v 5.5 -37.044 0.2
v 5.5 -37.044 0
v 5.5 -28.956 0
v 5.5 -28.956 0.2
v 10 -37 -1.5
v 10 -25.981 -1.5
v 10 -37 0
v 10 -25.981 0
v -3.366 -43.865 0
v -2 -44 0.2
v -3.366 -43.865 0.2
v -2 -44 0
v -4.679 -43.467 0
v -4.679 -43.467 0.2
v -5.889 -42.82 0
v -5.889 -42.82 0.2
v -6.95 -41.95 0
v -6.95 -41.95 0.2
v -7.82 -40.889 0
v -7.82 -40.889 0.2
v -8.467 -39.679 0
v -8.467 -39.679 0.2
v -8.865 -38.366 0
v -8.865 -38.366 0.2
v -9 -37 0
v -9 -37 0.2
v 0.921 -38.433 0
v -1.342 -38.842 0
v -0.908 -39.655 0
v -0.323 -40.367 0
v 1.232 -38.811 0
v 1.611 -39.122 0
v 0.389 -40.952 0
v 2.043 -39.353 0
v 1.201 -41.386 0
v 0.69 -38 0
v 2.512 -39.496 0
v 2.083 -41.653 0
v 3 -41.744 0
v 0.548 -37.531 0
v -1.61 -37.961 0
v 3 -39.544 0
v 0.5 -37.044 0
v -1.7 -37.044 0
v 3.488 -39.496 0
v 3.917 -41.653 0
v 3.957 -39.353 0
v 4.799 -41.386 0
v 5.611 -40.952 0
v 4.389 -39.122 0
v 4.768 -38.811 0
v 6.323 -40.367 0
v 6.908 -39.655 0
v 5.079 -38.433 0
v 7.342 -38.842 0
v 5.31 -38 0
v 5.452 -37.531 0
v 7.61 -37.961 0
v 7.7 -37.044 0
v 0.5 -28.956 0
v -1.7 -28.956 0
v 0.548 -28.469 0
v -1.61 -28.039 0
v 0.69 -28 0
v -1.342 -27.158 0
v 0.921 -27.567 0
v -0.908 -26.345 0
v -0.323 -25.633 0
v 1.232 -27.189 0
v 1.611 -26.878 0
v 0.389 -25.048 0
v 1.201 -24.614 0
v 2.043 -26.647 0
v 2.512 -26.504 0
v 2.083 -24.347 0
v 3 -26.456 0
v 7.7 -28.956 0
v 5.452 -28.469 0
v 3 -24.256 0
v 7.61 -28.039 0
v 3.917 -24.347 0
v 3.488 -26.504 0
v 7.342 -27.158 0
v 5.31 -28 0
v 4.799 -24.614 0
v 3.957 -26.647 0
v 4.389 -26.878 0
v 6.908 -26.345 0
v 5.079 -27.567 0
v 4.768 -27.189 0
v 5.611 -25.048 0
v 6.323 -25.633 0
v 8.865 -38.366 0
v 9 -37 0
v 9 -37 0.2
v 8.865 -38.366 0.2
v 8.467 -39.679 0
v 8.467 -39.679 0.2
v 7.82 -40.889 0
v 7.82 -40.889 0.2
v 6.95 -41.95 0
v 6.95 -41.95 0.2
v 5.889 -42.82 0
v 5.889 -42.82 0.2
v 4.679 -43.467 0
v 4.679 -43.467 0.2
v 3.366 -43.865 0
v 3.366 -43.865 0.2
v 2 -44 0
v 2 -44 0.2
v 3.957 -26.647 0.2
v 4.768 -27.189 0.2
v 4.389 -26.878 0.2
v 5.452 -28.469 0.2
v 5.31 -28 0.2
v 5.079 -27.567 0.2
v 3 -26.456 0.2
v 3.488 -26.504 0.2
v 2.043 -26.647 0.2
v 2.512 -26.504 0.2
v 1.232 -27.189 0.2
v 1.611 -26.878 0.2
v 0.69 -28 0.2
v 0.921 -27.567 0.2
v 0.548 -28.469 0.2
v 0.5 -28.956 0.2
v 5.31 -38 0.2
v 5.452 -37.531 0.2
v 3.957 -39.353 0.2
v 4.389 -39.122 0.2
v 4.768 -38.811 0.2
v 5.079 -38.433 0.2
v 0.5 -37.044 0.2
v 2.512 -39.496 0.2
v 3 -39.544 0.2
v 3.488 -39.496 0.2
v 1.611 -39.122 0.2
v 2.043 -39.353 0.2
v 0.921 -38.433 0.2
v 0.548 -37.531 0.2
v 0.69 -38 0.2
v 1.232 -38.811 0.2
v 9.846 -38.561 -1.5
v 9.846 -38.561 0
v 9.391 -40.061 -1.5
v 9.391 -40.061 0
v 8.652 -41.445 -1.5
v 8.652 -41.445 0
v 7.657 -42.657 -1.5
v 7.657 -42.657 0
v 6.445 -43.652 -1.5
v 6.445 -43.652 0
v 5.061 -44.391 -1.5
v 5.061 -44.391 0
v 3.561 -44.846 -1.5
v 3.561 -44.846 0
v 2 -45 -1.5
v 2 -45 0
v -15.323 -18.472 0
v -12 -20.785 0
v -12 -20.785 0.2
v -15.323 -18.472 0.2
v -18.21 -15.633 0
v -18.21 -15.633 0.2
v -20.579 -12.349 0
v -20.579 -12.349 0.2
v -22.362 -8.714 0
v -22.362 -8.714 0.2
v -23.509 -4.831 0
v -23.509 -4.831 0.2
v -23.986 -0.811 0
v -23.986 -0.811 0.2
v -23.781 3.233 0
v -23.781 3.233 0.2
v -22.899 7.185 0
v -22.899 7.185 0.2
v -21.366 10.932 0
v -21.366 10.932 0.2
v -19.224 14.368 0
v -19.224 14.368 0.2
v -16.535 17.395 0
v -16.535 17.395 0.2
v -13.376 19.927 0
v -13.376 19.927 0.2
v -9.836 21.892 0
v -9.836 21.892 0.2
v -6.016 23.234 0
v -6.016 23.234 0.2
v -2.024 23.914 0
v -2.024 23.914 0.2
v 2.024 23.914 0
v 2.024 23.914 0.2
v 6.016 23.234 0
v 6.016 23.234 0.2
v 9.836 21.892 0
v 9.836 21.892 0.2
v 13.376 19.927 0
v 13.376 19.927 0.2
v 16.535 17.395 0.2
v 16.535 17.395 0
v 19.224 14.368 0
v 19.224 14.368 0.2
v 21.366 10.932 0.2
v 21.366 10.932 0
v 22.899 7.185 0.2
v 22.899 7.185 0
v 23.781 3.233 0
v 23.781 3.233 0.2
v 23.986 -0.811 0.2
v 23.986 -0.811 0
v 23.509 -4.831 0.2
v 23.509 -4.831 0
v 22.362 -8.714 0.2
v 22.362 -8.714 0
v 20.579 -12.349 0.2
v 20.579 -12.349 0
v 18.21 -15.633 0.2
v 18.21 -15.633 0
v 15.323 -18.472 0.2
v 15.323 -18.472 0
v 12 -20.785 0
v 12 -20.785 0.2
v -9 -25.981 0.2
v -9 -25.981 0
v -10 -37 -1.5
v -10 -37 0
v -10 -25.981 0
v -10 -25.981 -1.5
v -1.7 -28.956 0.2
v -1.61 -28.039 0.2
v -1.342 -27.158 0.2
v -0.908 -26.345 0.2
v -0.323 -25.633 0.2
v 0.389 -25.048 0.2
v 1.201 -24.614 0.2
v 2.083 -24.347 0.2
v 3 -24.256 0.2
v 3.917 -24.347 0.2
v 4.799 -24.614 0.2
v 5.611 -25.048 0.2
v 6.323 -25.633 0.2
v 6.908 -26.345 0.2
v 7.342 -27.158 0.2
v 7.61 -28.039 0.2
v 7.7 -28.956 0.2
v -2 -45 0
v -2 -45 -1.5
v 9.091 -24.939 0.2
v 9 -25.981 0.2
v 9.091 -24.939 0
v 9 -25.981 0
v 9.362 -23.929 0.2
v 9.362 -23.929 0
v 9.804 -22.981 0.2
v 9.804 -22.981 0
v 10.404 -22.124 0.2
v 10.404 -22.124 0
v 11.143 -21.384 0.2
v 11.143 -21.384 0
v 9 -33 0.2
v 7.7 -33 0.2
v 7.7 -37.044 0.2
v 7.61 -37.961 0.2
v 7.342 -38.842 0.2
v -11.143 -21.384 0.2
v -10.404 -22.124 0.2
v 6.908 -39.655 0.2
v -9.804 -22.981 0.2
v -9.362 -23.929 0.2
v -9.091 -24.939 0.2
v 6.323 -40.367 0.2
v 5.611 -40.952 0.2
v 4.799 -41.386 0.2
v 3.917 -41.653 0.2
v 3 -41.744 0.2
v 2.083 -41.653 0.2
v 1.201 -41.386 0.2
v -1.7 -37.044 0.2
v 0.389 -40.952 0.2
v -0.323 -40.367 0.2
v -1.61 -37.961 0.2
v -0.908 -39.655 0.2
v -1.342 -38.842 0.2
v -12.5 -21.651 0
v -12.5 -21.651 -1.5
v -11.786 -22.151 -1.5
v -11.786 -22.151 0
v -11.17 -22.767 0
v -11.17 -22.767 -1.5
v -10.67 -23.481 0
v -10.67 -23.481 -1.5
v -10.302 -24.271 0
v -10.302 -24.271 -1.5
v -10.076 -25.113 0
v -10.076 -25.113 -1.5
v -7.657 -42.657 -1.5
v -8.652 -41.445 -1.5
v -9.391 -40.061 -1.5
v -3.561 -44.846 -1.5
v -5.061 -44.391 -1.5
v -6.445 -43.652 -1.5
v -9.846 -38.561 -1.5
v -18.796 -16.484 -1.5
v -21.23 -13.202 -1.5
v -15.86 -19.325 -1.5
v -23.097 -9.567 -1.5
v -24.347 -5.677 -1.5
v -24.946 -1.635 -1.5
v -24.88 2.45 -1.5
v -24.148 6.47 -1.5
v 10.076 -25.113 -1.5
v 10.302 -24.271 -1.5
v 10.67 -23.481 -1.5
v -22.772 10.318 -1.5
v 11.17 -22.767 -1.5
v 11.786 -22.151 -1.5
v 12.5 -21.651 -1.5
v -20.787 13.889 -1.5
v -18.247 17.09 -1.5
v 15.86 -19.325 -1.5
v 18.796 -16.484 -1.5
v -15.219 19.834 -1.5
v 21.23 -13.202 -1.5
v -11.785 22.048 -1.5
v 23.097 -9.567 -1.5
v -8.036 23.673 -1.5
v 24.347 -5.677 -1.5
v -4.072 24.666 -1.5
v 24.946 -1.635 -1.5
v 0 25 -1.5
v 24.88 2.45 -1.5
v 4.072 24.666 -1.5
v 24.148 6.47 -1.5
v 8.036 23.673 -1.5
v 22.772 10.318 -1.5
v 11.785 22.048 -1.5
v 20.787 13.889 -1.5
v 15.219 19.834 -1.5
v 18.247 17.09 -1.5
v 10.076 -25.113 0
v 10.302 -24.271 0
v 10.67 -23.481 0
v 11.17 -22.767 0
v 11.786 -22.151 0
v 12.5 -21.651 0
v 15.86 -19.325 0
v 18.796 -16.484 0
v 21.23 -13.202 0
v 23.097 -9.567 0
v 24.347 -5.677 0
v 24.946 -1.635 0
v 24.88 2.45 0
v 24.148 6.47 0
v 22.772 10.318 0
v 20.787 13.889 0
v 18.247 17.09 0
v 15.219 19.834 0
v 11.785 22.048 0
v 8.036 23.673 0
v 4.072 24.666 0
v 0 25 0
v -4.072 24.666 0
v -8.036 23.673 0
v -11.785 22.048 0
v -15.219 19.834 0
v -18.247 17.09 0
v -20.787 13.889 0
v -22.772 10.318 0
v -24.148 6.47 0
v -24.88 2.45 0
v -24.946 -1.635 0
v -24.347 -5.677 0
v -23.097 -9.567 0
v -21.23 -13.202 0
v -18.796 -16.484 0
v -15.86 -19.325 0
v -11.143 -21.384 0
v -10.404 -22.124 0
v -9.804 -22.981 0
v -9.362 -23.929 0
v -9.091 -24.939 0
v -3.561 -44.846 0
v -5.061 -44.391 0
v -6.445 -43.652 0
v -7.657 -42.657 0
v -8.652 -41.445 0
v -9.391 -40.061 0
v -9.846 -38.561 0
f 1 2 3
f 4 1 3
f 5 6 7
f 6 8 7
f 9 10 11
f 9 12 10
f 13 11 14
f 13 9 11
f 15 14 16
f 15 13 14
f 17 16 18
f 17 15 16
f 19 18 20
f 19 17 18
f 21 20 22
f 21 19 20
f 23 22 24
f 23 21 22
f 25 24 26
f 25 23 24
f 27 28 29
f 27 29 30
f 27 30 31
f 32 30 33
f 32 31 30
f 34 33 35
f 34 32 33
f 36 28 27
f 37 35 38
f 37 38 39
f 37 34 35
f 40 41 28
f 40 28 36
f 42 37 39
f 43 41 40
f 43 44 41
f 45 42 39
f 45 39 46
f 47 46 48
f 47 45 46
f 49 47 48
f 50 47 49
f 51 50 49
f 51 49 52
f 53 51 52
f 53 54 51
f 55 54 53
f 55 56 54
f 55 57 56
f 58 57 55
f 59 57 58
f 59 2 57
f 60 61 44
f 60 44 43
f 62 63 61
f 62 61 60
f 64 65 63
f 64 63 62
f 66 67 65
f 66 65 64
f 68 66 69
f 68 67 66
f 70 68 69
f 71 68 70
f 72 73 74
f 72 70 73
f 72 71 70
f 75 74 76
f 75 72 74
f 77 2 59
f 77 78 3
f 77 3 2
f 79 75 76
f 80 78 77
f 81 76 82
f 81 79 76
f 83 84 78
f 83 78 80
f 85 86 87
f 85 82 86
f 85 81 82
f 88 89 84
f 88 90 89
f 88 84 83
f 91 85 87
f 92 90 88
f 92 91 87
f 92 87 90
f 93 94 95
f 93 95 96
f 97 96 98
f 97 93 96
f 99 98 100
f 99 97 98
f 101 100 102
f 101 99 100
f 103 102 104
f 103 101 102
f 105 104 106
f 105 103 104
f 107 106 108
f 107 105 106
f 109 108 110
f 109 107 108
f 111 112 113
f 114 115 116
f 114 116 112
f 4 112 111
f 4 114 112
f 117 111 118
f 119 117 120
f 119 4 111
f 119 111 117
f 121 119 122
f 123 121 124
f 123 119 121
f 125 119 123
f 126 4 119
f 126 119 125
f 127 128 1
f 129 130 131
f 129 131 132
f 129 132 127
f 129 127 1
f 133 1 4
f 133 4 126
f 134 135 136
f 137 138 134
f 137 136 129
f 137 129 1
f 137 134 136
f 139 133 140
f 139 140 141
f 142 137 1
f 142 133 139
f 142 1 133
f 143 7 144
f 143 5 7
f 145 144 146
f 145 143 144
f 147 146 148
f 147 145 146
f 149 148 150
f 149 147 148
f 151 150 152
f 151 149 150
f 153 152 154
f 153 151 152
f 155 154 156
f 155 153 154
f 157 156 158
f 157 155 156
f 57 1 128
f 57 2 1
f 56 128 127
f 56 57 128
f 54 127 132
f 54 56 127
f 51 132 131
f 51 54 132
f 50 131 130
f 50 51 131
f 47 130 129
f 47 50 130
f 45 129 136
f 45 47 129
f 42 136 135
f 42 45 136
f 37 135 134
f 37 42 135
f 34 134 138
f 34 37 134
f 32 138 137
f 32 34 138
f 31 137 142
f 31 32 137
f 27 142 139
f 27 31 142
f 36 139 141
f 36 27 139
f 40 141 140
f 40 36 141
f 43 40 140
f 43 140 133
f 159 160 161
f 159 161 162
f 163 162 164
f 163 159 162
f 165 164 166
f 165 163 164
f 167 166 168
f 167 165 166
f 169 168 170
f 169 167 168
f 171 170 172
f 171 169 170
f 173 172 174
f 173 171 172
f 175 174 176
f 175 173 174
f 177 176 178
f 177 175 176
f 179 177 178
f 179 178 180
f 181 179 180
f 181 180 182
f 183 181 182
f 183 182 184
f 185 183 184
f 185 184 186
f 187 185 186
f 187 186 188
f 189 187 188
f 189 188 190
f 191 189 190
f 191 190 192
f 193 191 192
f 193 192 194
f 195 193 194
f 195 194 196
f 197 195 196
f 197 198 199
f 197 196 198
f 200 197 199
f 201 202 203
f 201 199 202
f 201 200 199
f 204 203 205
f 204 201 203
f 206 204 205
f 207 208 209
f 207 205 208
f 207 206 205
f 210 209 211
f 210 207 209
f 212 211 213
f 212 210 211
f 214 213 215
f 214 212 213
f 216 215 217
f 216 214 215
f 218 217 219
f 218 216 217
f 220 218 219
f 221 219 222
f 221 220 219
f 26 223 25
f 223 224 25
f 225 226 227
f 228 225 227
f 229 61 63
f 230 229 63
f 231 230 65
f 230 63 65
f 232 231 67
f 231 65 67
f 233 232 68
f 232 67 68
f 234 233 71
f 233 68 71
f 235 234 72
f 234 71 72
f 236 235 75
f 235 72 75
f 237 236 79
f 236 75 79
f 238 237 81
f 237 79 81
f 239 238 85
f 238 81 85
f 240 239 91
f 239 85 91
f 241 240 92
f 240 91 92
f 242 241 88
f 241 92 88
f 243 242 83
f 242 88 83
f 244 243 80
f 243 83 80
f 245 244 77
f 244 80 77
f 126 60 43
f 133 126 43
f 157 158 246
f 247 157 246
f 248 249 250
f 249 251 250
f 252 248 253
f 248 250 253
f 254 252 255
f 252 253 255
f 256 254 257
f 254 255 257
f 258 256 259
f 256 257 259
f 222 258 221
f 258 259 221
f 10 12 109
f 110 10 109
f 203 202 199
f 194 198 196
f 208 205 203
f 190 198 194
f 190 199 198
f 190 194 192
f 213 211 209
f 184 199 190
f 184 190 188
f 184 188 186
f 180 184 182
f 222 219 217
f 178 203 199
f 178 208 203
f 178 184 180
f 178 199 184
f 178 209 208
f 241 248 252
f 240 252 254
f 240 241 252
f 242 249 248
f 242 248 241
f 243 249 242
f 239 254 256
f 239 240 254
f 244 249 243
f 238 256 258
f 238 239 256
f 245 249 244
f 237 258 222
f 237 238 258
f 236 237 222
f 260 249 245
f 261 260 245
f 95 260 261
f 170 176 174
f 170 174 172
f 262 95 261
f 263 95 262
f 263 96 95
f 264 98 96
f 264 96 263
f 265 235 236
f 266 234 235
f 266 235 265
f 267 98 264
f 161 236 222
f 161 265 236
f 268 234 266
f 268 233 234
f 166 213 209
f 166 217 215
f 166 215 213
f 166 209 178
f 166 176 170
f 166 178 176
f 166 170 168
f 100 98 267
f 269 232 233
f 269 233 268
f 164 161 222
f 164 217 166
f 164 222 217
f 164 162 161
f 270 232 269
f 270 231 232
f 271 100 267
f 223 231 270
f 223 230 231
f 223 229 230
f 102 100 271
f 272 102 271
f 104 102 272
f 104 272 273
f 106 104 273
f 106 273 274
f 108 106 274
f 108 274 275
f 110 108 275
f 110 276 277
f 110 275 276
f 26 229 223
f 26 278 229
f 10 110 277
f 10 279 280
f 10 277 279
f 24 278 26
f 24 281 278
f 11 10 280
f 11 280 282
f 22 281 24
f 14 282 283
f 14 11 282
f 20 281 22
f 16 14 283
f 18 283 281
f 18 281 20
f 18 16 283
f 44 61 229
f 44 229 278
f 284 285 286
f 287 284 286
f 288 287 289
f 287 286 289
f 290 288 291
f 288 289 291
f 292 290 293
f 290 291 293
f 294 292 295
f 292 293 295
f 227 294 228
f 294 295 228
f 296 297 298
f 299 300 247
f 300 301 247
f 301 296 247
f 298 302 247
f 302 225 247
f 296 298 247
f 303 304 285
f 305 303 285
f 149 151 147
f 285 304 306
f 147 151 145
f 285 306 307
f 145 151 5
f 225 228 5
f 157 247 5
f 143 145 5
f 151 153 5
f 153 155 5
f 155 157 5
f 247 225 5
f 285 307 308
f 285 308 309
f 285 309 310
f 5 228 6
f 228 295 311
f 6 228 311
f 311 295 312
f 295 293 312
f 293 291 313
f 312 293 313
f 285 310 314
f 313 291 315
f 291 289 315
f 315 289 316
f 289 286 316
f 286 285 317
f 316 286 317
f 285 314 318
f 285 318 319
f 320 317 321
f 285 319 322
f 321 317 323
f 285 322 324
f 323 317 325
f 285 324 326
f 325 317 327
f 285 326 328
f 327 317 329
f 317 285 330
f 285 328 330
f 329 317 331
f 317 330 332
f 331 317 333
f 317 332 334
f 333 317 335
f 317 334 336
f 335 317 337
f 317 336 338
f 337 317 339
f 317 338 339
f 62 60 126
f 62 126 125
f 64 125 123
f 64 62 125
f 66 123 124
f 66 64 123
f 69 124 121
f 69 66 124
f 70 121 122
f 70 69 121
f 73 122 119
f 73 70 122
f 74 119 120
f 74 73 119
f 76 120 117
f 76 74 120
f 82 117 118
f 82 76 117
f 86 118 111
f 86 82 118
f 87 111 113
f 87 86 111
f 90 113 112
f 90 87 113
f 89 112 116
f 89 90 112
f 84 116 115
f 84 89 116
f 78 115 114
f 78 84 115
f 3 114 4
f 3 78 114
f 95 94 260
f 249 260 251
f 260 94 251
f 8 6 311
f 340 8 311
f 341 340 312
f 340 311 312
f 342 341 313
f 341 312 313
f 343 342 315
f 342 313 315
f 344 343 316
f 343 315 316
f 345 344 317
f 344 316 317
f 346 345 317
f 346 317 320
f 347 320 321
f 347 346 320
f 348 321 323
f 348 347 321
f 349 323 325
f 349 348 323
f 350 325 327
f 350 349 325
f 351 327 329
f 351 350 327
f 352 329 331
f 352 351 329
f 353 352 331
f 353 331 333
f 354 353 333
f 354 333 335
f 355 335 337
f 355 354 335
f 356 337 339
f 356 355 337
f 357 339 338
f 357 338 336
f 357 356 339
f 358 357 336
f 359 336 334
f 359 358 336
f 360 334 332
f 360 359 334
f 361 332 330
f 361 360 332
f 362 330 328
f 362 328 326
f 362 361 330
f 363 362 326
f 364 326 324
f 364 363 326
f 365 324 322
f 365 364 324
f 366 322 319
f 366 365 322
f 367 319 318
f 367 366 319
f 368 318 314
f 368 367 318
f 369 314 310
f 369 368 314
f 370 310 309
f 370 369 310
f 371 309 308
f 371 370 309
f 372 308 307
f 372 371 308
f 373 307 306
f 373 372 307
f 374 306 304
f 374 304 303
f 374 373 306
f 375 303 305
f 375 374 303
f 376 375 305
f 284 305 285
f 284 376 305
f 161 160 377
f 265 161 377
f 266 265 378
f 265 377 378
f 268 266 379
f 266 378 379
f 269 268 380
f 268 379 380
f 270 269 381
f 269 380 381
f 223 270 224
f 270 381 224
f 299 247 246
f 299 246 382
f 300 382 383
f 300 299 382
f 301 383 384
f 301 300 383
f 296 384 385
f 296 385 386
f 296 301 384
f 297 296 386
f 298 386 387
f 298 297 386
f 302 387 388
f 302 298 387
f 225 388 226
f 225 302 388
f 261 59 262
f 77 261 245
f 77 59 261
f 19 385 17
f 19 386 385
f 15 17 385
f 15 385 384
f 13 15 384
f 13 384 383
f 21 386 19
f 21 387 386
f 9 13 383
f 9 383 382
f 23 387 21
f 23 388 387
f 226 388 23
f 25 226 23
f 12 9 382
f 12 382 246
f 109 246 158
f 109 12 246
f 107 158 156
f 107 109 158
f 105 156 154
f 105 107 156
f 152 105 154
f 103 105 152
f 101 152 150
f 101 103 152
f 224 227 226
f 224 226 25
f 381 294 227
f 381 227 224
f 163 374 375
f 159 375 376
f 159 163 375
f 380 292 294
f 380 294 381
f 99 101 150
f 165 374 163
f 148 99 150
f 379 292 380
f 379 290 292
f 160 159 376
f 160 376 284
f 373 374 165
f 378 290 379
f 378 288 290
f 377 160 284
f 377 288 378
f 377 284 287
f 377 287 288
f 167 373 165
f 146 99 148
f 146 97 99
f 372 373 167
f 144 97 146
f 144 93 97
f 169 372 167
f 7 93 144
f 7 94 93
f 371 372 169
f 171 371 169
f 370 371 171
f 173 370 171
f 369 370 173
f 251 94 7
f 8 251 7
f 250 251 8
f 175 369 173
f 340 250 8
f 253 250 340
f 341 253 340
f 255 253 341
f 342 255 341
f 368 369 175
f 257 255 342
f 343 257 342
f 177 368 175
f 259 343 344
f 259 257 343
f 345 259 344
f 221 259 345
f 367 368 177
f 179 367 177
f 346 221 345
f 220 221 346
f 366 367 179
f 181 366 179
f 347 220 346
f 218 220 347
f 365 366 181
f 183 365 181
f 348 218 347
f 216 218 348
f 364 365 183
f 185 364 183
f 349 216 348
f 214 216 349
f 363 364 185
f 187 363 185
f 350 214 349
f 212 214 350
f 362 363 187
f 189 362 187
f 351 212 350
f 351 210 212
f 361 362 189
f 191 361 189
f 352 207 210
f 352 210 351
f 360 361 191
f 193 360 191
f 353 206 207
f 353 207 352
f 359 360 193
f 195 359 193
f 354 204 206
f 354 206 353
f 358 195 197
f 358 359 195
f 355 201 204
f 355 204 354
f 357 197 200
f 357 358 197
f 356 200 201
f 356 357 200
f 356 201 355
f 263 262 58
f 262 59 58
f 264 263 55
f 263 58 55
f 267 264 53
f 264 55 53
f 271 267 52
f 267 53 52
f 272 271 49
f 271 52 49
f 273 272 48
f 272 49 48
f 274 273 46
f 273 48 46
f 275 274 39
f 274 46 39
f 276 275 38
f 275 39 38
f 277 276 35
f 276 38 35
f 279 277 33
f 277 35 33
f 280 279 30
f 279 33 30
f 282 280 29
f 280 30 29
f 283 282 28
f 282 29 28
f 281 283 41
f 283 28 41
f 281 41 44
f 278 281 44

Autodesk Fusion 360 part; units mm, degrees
sketch "Sketch1" plane through (0, 0, 0) normal (0, 0, 1) x (1, 0, 0)
  circle A0 centre (0, 0) radius 25
  line L0 (10, -45) -> (-10, -45)
  line L1 (-10, -45) -> (-10, 45)
  line L2 (-10, 45) -> (10, 45)
  line L3 (10, 45) -> (10, -45)
  line L4 (10, -45) -> (-10, 45) construction
  line L5 (-10, -45) -> (10, 45) construction
  dimension "d1" = 50
  dimension "d2" = 90
  dimension "d3" = 20
extrude "Extrude1" add sketch "Sketch1" against normal blind 1.5 contours A0 L3 | A0 L1 L3 | A0 L0 L1 L3 | A0 L1
fillet "Fillet1" radius 8 2 edges at (-10, -45, -0.75) (10, -45, -0.75)
fillet "Fillet2" radius 5 2 edges at (-10, -22.9129, -0.75) (10, -22.9129, -0.75)
sketch "Sketch2" plane through (0, 0, 0) normal (0, 0, 1) x (-1, 0, 0)
  line L0 (-10, 37) -> (-10, 25.9808)
  arc A0 (-12.5, 21.6506) -> (12.5, 21.6506) centre (0, 0) ccw
  line L1 (10, 25.9808) -> (10, 37)
  line L2 (2, 45) -> (-2, 45)
  line L3 (-10, 33) -> (-3, 33)
  line L4 (-0.5, 28.9564) -> (-0.5, 37.0436)
  arc A1 (-0.5, 37.0436) -> (-5.5, 37.0436) centre (-3, 37.0436) ccw
  line L5 (-5.5, 37.0436) -> (-5.5, 28.9564)
  arc A2 (-5.5, 28.9564) -> (-0.5, 28.9564) centre (-3, 28.9564) ccw
  line L6 (-3, 28.9564) -> (-3, 37.0436) construction
  line L7 (1.7, 28.9564) -> (1.7, 37.0436)
  arc A3 (1.7, 37.0436) -> (-7.7, 37.0436) centre (-3, 37.0436) ccw
  line L8 (-7.7, 37.0436) -> (-7.7, 28.9564)
  arc A4 (-7.7, 28.9564) -> (1.7, 28.9564) centre (-3, 28.9564) ccw
  arc A5 (-2, 45) -> (-10, 37) centre (-2, 37) ccw
  arc A6 (-12.5, 21.6506) -> (-10, 25.9808) centre (-15, 25.9808) ccw
  arc A7 (10, 25.9808) -> (12.5, 21.6506) centre (15, 25.9808) ccw
  arc A8 (10, 37) -> (2, 45) centre (2, 37) ccw
  line L9 (-9, 37) -> (-9, 25.9808)
  arc A9 (-12, 20.7846) -> (-9, 25.9808) centre (-15, 25.9808) ccw
  arc A10 (-12, 20.7846) -> (12, 20.7846) centre (0, 0) ccw
  arc A11 (9, 25.9808) -> (12, 20.7846) centre (15, 25.9808) ccw
  line L10 (9, 25.9808) -> (9, 37)
  arc A12 (9, 37) -> (2, 44) centre (2, 37) ccw
  line L11 (2, 44) -> (-2, 44)
  arc A13 (-2, 44) -> (-9, 37) centre (-2, 37) ccw
  point P0 (-3, 33)
  dimension "d6" = 7
  dimension "d7" = 5
  dimension "d8" = 2.2
  dimension "d14" = 1
extrude "Extrude2" add sketch "Sketch2" along normal blind 0.2 contours L4 A1 L5 A2 | L9 A9 A10 A11 L10 A12 L11 A13
